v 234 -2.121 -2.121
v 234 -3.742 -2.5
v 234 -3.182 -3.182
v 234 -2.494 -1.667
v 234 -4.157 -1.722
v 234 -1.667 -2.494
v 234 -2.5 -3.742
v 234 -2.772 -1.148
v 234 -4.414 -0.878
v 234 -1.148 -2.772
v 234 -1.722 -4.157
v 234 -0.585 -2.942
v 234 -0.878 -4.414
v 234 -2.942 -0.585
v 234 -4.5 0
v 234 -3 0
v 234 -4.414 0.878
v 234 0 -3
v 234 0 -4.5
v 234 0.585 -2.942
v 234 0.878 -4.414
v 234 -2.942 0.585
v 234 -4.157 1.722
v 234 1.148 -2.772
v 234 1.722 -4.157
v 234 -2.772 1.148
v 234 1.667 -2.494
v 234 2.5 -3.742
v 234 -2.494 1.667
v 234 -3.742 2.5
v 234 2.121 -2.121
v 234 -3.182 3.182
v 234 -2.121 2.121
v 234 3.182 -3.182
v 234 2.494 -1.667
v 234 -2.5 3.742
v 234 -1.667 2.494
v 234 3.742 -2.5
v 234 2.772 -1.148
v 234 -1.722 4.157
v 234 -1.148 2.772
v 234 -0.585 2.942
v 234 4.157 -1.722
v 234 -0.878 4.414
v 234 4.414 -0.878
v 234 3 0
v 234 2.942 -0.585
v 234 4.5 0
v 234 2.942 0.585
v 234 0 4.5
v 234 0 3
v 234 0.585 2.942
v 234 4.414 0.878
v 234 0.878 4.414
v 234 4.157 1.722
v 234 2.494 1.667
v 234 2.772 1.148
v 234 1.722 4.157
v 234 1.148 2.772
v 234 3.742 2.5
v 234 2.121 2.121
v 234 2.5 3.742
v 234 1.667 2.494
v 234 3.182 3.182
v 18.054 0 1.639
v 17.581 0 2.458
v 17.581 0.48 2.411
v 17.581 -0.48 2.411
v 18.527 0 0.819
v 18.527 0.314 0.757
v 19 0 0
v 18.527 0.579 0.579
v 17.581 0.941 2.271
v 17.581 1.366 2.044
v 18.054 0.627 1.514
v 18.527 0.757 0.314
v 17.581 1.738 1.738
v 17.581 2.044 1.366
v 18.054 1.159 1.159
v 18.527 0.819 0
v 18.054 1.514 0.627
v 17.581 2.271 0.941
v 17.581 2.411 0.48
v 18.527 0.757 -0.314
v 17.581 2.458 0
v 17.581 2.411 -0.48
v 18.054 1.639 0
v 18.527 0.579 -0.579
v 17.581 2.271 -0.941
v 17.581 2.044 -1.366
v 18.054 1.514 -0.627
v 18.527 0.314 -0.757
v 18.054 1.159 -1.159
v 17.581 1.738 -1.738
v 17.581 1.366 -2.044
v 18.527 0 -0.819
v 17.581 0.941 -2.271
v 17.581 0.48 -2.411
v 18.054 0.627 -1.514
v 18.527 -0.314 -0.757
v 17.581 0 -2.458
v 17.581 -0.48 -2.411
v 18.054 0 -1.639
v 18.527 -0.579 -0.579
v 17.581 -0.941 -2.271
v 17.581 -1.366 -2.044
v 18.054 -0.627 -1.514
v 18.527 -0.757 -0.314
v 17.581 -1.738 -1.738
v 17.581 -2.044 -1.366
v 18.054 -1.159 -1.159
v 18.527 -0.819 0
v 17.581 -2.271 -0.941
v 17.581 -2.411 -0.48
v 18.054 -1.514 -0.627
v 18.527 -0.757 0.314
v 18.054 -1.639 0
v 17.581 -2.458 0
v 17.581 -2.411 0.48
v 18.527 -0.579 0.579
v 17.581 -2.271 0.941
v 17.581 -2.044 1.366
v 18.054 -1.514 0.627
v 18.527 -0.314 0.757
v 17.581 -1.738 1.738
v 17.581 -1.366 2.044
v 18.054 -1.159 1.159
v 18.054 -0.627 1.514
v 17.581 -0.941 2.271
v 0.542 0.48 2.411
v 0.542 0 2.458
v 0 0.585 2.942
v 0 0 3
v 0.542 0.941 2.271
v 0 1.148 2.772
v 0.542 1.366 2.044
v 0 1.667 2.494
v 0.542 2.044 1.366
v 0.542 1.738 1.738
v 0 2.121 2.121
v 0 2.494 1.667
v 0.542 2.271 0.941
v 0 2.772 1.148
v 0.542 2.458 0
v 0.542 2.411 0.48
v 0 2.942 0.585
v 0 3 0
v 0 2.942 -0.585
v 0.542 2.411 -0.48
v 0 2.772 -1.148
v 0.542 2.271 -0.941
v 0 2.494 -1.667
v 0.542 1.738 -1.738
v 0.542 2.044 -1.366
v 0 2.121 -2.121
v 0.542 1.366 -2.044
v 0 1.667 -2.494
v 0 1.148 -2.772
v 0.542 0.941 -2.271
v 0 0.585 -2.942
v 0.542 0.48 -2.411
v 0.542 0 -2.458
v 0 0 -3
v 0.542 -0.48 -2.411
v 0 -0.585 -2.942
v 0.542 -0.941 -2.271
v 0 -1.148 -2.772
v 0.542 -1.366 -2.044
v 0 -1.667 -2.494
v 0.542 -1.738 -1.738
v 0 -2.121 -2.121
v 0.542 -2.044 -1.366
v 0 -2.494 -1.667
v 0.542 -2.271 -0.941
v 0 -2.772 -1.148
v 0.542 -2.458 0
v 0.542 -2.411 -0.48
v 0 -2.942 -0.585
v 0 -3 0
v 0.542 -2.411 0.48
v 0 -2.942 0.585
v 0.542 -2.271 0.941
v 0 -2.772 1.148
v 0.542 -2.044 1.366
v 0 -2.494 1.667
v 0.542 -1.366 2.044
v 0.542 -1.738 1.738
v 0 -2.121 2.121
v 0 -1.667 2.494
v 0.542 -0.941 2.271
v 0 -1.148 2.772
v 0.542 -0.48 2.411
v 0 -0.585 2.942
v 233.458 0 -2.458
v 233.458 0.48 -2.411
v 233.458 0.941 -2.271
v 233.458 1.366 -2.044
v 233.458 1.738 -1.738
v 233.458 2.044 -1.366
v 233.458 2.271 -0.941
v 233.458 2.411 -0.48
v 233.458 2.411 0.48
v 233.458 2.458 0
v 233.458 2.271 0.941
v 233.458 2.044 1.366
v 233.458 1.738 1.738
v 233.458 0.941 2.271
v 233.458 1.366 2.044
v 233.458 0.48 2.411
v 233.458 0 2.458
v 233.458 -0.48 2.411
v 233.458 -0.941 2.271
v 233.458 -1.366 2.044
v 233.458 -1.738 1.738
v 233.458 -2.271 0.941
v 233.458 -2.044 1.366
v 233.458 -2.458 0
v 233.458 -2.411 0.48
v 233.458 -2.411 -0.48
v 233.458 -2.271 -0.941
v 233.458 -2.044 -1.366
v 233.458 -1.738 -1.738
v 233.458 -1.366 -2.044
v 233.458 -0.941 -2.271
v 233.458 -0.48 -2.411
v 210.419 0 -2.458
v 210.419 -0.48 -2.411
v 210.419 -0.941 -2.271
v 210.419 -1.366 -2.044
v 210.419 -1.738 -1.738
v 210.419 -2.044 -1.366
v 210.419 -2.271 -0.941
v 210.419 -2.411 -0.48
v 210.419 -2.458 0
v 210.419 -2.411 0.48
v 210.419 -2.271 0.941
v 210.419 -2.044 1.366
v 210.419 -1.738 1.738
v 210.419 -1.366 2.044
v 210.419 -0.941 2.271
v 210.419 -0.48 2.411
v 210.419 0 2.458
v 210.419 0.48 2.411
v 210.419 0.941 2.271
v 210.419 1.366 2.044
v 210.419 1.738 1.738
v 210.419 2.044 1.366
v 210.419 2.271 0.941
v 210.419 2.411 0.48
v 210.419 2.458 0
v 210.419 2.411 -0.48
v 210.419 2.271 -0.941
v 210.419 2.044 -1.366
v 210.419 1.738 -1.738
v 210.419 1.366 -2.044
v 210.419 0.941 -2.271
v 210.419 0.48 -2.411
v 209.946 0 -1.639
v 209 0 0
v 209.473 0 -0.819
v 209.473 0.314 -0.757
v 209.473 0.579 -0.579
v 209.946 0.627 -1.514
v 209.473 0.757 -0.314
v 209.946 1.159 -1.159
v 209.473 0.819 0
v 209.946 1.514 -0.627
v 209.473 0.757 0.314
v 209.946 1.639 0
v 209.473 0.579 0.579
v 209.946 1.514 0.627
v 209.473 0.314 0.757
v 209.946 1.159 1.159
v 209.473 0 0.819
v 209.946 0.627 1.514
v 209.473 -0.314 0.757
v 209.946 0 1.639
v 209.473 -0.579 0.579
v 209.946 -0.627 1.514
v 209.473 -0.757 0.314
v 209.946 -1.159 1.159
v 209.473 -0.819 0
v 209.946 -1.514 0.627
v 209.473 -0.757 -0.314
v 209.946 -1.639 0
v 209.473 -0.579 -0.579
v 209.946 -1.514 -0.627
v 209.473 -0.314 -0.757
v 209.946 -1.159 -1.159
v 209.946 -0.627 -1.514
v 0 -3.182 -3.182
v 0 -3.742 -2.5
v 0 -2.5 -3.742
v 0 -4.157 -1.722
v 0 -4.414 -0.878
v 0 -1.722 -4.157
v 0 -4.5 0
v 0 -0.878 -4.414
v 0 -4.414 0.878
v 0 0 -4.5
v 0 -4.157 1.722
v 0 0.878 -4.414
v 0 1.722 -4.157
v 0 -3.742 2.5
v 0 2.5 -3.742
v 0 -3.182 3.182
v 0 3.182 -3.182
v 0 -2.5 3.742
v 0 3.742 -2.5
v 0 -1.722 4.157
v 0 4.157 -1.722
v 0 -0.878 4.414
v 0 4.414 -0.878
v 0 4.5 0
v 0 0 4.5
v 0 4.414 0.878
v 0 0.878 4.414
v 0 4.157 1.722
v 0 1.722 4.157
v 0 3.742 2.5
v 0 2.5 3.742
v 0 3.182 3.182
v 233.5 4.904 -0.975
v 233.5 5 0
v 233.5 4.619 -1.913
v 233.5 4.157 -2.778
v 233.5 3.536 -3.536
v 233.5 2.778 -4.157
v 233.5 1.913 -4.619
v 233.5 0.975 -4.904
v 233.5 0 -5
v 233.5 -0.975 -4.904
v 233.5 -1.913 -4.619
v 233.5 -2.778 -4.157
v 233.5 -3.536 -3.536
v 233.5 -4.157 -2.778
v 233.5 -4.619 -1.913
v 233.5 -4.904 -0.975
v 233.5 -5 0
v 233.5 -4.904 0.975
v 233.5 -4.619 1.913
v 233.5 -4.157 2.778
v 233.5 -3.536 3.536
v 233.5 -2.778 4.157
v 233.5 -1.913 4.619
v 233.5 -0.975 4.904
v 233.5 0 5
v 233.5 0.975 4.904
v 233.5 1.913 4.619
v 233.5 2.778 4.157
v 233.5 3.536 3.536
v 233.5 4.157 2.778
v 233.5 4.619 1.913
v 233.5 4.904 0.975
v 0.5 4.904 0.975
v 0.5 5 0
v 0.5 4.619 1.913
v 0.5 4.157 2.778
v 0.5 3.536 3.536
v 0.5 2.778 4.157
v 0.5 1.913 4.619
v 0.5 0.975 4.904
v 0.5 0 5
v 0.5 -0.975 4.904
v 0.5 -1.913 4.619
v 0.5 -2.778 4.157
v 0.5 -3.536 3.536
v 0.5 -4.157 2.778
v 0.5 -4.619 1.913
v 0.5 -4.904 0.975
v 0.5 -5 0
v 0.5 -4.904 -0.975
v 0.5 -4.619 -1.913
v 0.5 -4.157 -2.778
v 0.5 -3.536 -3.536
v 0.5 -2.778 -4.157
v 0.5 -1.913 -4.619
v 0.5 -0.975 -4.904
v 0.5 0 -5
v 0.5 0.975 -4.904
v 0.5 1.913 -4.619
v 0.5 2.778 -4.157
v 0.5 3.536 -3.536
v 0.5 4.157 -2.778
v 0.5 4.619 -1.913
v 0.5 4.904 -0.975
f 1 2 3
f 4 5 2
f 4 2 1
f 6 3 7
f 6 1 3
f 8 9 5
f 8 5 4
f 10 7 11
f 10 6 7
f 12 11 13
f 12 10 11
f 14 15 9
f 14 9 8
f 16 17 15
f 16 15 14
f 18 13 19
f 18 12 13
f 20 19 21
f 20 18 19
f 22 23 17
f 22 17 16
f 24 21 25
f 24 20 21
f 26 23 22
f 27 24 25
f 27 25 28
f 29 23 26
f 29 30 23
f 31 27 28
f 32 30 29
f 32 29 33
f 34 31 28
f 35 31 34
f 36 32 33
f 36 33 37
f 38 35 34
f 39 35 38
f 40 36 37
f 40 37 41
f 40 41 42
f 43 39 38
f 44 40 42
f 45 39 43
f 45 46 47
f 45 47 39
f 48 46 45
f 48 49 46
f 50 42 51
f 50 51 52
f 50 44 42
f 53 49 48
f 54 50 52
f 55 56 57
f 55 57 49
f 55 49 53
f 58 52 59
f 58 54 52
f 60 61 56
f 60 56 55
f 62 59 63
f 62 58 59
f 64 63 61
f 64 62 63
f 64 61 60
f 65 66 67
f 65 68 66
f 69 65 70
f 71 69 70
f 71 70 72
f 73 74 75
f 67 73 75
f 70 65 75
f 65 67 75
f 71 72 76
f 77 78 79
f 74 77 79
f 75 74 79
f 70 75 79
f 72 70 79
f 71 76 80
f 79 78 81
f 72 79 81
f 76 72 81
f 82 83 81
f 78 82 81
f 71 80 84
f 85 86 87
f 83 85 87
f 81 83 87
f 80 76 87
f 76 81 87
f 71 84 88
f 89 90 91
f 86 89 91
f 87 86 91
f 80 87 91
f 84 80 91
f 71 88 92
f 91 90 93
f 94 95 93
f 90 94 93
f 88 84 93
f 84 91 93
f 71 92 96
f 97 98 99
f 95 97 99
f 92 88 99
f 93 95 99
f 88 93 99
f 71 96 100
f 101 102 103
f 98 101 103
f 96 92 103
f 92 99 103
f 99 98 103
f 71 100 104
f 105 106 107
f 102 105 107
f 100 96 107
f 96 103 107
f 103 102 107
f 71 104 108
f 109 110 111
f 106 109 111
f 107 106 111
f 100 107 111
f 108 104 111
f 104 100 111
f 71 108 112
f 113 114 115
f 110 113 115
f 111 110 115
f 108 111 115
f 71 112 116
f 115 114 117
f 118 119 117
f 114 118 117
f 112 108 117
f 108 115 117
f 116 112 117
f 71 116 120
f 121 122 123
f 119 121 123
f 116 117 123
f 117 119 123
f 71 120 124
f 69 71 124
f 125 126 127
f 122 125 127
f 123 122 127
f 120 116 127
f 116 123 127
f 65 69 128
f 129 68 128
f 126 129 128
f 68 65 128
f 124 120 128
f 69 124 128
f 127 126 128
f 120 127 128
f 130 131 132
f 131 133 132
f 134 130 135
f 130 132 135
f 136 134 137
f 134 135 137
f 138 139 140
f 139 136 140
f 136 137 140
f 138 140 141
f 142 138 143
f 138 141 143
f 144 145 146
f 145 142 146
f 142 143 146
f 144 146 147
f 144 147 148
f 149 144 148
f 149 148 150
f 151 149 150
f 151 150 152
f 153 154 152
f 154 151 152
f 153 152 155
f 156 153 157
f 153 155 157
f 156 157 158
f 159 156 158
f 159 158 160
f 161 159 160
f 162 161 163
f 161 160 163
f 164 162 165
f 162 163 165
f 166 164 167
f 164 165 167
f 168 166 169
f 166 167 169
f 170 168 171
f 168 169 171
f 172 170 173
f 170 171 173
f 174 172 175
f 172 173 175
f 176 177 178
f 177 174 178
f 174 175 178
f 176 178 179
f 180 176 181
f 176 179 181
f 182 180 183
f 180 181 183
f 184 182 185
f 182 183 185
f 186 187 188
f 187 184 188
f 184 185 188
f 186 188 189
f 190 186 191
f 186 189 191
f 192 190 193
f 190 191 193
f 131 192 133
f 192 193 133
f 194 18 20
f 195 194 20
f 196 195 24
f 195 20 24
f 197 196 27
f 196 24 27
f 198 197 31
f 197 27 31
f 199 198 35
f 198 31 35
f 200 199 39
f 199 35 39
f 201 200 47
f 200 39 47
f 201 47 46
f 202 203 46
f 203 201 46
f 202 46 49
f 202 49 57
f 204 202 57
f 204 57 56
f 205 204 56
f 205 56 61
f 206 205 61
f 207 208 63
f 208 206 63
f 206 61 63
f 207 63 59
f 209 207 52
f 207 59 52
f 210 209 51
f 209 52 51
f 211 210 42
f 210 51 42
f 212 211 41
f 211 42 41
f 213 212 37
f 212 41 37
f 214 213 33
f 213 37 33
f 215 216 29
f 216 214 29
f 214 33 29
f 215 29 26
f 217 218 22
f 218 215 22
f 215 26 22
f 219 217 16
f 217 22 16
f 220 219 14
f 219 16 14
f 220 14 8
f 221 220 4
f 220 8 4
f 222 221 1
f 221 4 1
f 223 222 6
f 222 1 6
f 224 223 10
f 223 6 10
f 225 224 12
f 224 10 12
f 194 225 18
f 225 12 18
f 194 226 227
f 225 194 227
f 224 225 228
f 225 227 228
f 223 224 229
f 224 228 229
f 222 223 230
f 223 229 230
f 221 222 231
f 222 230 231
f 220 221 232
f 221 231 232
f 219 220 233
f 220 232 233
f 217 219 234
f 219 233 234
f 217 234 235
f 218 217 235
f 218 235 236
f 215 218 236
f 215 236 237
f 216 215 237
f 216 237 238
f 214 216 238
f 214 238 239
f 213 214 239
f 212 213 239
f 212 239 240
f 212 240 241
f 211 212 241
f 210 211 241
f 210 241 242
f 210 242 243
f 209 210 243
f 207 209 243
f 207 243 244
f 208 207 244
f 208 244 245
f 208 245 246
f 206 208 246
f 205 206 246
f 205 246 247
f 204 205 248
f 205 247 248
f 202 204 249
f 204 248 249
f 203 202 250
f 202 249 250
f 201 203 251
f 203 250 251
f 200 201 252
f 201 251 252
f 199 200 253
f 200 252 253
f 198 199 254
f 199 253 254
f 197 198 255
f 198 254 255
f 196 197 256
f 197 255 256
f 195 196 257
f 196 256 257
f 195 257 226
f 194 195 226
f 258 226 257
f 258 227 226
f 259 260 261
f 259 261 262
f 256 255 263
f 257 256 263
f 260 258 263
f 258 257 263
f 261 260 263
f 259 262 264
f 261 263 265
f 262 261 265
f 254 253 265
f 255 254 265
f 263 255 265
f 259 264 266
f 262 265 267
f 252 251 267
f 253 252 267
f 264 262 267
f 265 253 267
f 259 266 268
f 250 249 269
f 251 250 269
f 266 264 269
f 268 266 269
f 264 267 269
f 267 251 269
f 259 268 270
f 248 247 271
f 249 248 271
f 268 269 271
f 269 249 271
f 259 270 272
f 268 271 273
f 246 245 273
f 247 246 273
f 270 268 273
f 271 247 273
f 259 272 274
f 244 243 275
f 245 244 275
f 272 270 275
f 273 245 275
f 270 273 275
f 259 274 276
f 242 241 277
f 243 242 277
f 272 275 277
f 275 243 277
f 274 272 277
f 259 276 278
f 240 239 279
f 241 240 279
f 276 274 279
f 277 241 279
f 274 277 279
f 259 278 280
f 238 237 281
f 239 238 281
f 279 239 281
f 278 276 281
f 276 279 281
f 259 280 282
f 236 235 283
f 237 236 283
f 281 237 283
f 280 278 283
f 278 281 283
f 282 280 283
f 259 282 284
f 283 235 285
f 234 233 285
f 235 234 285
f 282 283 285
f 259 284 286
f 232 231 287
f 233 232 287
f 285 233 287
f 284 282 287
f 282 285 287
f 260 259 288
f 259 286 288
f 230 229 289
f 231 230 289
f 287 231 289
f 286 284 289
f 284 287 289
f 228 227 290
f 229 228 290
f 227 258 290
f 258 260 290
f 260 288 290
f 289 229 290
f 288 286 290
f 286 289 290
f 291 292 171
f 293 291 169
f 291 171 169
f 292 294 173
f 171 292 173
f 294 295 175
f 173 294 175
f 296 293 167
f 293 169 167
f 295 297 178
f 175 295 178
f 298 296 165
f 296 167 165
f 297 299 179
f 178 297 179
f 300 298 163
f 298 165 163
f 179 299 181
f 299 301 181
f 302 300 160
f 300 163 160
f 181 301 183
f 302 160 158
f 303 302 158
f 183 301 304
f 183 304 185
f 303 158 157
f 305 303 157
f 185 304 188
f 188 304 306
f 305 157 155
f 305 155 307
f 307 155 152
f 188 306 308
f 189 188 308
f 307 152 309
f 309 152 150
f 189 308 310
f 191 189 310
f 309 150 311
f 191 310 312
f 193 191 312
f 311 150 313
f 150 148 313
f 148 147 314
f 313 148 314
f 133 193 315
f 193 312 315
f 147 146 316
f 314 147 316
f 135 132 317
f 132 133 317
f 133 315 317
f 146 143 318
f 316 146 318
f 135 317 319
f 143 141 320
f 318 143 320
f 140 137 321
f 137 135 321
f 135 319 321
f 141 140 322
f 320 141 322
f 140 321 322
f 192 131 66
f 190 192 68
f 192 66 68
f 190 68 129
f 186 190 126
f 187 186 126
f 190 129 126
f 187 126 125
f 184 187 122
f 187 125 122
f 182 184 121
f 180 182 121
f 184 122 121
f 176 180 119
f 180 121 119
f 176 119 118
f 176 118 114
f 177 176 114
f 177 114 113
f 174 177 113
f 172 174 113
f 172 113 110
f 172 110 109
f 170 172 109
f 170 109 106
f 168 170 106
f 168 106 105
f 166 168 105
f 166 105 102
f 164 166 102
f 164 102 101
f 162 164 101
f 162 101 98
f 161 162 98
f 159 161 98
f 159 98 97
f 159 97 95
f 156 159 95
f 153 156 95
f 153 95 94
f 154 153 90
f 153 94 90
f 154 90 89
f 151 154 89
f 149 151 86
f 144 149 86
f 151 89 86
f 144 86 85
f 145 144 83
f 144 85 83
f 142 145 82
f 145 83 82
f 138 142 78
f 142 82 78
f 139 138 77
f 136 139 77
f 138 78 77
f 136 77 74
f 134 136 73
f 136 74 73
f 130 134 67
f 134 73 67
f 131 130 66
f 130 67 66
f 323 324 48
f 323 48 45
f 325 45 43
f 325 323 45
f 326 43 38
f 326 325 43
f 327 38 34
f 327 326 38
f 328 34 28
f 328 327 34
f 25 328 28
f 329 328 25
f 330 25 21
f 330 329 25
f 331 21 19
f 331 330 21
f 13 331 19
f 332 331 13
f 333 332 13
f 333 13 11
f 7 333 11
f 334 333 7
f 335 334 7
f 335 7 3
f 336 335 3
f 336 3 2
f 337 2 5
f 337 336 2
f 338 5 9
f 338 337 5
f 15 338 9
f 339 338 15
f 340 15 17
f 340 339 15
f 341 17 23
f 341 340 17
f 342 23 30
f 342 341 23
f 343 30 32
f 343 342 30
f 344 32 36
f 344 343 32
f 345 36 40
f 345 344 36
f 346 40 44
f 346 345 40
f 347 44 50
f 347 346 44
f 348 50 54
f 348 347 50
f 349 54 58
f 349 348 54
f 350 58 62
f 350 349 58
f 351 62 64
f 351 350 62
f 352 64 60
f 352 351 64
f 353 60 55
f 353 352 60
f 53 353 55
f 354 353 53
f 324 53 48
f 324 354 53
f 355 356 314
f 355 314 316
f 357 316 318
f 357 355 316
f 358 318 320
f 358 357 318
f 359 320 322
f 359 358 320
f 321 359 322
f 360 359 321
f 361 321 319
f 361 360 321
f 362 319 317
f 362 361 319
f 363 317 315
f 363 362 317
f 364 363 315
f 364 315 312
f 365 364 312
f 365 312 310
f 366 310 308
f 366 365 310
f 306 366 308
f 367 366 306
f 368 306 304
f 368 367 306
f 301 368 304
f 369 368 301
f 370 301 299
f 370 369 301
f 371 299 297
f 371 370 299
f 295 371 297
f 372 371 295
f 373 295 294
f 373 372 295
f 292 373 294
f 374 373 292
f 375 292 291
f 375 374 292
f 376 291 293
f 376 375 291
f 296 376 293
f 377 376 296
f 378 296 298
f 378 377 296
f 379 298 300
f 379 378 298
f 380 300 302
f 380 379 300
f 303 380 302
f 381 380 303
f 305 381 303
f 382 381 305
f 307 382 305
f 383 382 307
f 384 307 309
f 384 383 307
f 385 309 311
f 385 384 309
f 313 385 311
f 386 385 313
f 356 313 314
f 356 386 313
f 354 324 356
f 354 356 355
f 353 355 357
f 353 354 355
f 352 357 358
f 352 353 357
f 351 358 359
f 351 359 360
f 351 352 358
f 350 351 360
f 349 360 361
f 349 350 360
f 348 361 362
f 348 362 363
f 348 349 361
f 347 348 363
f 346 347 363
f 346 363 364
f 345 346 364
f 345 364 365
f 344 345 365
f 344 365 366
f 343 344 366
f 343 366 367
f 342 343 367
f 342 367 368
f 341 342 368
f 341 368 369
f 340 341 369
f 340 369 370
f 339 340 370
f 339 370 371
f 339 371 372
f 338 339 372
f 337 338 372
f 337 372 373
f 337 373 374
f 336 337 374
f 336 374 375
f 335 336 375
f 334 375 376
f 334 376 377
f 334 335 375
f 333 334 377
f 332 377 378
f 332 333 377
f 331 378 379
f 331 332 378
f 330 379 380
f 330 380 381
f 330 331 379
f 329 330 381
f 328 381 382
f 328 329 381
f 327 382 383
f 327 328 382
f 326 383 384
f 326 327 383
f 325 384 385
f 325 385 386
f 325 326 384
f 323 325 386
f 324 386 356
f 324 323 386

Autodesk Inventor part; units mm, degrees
ref_plane "YZ Plane" through (0, 0, 0) normal (1, 0, 0) x (0, 1, 0)
ref_plane "XZ Plane" through (0, 0, 0) normal (0, 1, 0) x (-1, 0, 0)
ref_plane "XY Plane" through (0, 0, 0) normal (0, 0, 1) x (1, 0, 0)
sketch "Sketch_1" plane through (0, 0, 0) normal (0, 0, 1) x (1, 0, 0)
  line L0 (234, 0) -> (0, 0)
  line L1 (0, 0) -> (0, 4.5)
  line L2 (0, 4.5) -> (0.5, 5)
  line L3 (0.5, 5) -> (233.5, 5)
  line L4 (233.5, 5) -> (234, 4.5)
  line L5 (234, 4.5) -> (234, 0)
  line L6 (234, 0) -> (0, 0)
revolve "Revolution1" add sketch "Sketch_1" angle 360 about axis through (234, 0, 0) along (1, 0, 0)
sketch "Sketch2" plane through (0, 0, 0) normal (-1, 0, 0) x (0, 0, 1)
  point P0 (0, 0)
hole "Hole1" at (0, 0, 0) direction (1, 0, 0) diameter 4.917 depth 17.5806 tip angle 120 countersink diameter 6 countersink angle 90 thread size "M6x1" class "6H" standard "ISO Metric profile"
sketch "Sketch3" plane through (234, 0, 0) normal (1, 0, 0) x (0, 0, -1)
  point P0 (0, 0)
hole "Hole2" at (234, 0, 0) direction (-1, 0, 0) diameter 4.917 depth 23.5806 tip angle 120 countersink diameter 6 countersink angle 90 thread size "M6x1" class "6H" standard "ISO Metric profile"
properties part number "SSFMRW10-234-M6-ND6_s"
